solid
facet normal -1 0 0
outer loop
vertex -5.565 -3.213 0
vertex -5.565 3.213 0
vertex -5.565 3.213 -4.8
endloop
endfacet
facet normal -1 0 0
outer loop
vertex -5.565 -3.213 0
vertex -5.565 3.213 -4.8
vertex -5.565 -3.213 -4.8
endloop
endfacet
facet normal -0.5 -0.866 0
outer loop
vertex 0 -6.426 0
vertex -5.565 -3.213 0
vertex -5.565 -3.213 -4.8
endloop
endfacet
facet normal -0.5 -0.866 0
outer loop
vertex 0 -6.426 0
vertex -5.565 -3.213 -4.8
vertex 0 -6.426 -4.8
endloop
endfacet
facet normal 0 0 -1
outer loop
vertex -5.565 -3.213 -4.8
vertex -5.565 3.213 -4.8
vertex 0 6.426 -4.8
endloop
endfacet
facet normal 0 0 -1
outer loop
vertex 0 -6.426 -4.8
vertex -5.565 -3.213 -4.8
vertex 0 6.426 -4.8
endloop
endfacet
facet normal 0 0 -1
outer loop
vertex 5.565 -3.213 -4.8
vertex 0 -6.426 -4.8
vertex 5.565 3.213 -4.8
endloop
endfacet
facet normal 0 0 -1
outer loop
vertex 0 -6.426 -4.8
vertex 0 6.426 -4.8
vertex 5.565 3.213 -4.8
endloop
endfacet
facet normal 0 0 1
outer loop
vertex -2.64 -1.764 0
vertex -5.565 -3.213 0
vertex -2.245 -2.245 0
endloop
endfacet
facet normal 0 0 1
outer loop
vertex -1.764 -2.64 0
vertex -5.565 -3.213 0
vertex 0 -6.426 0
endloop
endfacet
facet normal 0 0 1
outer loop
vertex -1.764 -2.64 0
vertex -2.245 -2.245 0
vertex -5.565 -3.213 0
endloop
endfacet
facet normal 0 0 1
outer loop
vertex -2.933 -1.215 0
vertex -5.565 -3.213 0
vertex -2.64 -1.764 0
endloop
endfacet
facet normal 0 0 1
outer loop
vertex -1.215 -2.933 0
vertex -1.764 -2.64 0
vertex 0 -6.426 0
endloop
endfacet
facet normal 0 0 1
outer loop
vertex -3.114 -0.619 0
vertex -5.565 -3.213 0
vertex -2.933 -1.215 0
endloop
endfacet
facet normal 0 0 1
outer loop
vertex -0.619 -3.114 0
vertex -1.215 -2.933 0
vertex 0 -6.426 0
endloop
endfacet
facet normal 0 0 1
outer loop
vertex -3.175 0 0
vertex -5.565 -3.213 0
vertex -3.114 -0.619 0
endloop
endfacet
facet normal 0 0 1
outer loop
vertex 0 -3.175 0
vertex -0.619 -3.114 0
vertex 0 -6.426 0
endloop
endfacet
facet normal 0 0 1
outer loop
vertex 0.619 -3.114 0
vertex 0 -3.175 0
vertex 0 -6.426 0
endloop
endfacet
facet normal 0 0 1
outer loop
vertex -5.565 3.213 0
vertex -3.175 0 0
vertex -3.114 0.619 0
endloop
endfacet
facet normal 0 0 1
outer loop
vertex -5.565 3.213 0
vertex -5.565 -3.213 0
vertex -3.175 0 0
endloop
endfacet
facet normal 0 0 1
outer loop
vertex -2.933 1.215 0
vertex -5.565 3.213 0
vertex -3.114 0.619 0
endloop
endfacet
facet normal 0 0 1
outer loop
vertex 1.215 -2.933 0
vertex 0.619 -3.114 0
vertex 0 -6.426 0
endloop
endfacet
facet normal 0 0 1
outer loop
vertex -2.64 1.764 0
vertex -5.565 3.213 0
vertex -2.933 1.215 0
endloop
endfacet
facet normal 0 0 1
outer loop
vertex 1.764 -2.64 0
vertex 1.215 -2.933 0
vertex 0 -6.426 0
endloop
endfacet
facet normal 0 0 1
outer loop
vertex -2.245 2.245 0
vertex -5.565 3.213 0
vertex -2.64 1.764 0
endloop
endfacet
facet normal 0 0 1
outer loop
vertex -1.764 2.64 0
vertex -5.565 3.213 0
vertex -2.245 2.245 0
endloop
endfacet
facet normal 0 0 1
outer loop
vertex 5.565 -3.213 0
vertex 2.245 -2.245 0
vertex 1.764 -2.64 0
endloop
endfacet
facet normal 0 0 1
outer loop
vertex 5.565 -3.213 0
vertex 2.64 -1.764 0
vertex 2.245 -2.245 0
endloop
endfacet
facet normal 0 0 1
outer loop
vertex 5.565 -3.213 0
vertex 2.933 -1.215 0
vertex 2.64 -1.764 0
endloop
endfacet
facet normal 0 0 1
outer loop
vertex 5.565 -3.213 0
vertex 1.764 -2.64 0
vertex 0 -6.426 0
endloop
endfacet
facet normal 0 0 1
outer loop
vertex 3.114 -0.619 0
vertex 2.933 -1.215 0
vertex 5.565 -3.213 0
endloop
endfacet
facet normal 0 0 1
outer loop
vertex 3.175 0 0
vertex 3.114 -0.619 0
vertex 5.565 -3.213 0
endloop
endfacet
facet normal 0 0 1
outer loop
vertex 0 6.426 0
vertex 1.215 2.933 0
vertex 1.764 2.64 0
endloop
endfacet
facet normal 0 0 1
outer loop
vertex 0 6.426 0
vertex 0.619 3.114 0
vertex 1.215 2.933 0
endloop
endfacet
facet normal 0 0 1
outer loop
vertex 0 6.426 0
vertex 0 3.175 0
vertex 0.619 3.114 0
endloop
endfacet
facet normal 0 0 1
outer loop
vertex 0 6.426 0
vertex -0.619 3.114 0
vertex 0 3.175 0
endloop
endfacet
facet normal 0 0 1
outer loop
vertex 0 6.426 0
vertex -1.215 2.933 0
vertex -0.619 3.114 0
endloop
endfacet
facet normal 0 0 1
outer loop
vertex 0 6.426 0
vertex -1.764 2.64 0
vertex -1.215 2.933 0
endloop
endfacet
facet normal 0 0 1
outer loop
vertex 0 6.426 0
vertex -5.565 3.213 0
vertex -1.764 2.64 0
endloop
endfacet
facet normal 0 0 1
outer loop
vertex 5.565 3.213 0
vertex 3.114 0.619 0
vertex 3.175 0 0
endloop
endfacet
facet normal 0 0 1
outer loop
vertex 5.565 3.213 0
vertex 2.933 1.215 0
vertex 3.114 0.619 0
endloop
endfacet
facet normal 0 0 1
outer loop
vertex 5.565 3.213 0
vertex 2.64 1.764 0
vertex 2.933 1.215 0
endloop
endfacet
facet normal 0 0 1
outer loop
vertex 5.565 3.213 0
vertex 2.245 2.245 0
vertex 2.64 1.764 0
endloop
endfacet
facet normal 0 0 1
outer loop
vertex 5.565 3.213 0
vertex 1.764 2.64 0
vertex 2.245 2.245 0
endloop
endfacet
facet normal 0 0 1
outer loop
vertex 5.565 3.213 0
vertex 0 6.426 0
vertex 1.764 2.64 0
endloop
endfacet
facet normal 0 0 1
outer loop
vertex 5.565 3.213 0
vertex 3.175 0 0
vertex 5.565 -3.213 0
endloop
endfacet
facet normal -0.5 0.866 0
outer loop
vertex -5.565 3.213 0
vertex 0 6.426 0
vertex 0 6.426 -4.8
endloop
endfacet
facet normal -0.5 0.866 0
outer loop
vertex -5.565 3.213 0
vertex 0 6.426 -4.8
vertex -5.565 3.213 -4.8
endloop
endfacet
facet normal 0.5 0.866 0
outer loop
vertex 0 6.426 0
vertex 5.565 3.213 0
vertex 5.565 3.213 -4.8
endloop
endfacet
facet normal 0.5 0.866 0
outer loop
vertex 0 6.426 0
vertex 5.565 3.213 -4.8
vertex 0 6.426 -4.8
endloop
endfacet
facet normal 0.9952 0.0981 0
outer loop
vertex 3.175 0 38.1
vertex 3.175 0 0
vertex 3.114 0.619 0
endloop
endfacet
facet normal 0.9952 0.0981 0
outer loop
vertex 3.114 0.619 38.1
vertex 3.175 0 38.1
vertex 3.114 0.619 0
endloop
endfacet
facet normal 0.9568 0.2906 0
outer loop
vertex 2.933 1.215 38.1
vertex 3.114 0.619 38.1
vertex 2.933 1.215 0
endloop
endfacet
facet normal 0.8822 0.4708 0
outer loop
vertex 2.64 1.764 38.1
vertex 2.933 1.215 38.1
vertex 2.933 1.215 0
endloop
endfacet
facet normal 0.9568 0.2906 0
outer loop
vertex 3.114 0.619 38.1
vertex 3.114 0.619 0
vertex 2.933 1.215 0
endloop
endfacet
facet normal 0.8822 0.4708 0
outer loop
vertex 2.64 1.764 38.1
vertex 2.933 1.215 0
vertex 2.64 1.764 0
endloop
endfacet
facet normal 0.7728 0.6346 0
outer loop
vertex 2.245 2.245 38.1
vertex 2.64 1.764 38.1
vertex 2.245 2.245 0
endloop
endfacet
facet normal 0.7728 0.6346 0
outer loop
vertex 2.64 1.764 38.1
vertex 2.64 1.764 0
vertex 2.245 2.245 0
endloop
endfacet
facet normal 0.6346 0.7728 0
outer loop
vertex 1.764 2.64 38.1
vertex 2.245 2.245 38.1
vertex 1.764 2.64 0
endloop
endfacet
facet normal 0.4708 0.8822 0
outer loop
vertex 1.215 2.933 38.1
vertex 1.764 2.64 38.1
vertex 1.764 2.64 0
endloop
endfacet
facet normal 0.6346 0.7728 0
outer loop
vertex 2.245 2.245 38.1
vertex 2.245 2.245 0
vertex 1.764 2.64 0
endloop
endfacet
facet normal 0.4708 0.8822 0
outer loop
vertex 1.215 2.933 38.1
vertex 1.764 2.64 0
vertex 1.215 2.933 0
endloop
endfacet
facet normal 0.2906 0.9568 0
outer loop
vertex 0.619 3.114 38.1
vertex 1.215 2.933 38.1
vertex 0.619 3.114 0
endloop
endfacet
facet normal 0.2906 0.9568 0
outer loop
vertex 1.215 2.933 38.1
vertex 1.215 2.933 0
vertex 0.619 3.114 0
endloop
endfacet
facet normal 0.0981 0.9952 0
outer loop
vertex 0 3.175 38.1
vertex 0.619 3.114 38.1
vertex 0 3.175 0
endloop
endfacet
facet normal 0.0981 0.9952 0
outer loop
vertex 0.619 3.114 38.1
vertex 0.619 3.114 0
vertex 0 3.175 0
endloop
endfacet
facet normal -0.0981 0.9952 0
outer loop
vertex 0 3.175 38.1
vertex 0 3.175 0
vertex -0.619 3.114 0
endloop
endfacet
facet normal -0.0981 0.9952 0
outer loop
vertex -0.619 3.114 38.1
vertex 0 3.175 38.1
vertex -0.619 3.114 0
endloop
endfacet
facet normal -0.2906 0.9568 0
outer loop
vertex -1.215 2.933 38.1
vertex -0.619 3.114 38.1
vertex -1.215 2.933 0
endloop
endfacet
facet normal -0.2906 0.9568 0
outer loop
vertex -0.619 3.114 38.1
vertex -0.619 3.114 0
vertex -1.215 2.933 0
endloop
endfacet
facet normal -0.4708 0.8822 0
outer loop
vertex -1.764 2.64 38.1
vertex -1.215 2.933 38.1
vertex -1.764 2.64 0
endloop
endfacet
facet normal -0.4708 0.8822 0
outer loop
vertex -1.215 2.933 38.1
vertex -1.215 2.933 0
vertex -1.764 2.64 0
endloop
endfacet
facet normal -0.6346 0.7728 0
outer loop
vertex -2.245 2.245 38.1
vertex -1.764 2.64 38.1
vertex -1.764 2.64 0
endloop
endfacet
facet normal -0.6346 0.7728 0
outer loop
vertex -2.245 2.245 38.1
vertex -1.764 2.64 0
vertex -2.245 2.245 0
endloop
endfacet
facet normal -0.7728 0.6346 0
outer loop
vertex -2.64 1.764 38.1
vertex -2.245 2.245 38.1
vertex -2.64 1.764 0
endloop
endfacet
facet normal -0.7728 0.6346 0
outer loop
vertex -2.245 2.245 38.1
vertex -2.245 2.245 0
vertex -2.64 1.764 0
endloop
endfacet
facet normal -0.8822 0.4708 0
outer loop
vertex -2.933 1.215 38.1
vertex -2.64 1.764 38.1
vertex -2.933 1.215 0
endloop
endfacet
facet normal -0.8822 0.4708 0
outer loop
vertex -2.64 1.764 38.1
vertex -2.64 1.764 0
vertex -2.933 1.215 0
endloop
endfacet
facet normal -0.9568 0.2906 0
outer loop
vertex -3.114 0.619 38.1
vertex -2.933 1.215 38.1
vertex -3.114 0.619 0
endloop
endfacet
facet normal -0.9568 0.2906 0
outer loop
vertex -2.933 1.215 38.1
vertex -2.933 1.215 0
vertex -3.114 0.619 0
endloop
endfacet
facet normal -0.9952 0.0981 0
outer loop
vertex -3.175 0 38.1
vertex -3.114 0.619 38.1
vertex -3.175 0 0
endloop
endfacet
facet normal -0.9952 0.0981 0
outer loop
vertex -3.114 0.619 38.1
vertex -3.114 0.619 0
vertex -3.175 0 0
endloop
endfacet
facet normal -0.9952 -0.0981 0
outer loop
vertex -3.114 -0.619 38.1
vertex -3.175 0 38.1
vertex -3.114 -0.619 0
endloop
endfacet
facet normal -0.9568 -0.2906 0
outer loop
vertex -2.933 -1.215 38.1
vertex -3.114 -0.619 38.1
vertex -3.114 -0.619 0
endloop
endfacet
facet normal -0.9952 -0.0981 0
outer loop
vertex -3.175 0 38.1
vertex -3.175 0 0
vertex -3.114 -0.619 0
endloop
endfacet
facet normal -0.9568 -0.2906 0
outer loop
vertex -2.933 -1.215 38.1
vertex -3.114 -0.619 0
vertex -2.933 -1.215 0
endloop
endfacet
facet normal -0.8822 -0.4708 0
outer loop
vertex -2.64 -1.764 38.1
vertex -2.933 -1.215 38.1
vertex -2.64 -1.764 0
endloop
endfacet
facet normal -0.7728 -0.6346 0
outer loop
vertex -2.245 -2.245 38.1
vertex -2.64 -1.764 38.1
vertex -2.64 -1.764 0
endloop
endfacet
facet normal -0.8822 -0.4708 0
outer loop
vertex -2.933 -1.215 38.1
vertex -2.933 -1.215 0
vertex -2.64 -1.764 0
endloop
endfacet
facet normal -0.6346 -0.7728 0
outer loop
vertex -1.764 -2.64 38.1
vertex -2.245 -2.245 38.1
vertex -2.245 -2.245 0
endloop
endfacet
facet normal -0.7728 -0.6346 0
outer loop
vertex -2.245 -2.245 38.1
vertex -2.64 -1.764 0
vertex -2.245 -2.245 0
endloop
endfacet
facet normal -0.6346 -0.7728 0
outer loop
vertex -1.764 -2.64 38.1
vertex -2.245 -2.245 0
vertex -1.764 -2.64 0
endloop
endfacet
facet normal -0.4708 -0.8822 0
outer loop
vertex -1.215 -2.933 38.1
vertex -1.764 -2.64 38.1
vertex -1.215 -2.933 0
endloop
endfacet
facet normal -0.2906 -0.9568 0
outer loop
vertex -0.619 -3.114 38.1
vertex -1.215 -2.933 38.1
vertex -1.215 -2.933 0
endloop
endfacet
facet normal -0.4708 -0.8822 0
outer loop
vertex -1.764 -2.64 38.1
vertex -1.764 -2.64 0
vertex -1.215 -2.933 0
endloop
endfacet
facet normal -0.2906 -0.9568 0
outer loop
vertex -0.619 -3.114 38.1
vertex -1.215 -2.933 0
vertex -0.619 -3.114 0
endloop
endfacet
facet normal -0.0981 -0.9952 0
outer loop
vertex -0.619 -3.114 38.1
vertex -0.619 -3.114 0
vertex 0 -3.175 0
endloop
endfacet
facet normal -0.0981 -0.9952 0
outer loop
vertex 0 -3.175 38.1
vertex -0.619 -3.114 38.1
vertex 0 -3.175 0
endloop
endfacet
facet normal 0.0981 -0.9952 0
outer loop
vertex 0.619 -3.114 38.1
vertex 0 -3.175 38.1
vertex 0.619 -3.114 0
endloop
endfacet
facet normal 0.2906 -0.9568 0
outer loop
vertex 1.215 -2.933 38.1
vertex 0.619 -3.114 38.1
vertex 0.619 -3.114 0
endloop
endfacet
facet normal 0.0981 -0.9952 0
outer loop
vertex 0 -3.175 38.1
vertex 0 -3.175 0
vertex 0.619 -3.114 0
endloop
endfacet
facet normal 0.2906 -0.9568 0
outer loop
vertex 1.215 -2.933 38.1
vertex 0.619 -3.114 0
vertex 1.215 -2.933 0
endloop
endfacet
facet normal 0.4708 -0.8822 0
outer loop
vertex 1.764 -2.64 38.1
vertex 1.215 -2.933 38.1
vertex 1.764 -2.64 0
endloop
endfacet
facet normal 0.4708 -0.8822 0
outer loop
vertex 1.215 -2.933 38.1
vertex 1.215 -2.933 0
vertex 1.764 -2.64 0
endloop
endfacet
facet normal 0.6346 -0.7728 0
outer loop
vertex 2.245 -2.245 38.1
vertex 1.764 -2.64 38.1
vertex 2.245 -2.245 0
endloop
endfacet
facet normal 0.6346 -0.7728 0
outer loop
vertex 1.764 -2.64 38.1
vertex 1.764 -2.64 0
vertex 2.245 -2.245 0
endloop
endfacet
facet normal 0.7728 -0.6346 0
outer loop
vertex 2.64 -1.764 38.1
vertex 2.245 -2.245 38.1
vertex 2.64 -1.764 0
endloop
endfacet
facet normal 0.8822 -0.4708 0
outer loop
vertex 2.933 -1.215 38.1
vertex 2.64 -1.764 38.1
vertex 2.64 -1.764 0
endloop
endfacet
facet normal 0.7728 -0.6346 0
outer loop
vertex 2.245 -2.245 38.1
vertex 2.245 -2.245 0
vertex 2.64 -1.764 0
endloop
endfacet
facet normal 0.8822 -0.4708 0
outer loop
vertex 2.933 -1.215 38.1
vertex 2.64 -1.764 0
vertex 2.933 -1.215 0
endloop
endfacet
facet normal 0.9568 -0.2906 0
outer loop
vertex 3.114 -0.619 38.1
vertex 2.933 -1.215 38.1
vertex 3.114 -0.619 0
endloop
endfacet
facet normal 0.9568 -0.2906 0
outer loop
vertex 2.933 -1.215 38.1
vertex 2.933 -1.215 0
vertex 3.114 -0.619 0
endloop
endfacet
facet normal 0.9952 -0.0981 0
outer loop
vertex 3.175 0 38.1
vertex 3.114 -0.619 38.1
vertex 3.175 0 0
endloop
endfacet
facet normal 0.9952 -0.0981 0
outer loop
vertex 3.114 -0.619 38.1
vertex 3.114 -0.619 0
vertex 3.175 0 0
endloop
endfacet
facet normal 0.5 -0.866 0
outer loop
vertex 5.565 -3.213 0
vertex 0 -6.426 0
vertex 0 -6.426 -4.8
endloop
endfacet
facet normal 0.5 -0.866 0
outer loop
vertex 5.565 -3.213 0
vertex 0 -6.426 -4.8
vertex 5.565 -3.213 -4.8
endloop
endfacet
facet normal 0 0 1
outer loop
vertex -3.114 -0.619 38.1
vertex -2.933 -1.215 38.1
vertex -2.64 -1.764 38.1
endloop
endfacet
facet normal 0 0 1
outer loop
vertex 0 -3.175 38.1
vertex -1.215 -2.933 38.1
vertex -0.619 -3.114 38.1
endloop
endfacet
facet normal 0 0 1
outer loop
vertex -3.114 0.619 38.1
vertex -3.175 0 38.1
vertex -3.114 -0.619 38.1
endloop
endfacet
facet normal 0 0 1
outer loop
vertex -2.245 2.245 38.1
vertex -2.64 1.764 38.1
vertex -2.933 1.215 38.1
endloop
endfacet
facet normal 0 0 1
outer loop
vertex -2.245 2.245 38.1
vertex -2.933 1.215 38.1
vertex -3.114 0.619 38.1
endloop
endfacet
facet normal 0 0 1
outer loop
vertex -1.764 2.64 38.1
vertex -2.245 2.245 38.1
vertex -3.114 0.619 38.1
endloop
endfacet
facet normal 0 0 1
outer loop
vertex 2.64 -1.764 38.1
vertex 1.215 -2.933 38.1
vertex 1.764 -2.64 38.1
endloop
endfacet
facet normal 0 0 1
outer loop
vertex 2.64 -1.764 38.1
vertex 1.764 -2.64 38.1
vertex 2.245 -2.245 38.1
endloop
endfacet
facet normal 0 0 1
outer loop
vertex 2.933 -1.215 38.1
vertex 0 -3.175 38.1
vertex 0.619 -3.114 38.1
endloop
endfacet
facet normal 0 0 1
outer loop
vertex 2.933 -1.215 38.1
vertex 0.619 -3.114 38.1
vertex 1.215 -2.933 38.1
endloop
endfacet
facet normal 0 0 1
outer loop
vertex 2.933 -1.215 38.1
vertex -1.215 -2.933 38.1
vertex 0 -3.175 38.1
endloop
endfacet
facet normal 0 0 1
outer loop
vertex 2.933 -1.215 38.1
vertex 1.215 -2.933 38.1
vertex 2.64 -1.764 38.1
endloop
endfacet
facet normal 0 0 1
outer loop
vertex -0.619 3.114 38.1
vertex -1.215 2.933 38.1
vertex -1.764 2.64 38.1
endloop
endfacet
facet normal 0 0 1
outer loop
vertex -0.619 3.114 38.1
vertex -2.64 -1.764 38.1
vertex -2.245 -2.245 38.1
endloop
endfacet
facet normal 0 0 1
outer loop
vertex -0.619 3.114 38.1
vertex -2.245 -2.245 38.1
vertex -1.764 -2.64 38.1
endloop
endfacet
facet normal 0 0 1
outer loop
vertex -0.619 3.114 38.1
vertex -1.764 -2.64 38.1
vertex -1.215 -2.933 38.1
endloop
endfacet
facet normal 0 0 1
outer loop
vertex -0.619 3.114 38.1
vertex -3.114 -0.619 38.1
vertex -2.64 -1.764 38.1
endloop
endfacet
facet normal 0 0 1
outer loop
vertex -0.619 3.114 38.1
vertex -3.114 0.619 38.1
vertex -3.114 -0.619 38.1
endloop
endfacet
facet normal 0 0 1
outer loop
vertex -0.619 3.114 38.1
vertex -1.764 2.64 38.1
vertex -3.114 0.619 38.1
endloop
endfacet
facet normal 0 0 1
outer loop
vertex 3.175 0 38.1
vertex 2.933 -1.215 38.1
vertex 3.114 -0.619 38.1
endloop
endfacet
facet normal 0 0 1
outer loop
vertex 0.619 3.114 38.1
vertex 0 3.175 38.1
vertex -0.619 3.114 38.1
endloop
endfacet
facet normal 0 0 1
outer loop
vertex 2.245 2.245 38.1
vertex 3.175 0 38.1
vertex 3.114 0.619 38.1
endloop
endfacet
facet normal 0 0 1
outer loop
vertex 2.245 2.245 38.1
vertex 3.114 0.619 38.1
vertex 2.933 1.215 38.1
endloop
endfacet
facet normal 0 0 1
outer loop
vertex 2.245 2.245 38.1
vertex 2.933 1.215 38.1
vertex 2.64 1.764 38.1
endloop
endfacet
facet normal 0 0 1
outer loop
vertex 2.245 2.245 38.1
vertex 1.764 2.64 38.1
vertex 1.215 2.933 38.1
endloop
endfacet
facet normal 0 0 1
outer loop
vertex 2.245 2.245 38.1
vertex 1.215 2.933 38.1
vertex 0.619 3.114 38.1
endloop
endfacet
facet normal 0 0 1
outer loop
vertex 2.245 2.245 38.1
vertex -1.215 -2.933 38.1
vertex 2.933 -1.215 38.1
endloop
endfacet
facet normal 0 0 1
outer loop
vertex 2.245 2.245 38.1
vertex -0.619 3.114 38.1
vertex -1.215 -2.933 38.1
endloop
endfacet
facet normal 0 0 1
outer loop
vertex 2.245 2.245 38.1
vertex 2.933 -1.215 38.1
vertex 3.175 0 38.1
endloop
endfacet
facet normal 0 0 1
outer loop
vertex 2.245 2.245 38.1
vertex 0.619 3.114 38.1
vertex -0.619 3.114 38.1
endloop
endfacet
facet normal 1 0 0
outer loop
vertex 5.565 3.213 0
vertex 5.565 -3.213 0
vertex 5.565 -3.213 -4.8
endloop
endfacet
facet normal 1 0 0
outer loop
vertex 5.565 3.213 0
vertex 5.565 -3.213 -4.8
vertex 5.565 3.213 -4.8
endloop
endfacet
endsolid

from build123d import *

# Parameters (mm, degrees)
SKETCH_R     = 3.175
PAD_DEPTH    = 38.1
PAD001_DEPTH = 4.8


with BuildPart() as part:
    # Sketch → Pad (new body)
    with BuildSketch(Plane.XY):
        Circle(SKETCH_R)
    extrude(amount=PAD_DEPTH)

    # Sketch001 → Pad001 (join)
    with BuildSketch(Plane.XY):
        Polygon((0, 6.425908), (-5.565, 3.212954), (-5.565, -3.212954), (0, -6.425908), (5.565, -3.212954), (5.565, 3.212954), align=None)
    extrude(amount=-PAD001_DEPTH)


solid = part.part
